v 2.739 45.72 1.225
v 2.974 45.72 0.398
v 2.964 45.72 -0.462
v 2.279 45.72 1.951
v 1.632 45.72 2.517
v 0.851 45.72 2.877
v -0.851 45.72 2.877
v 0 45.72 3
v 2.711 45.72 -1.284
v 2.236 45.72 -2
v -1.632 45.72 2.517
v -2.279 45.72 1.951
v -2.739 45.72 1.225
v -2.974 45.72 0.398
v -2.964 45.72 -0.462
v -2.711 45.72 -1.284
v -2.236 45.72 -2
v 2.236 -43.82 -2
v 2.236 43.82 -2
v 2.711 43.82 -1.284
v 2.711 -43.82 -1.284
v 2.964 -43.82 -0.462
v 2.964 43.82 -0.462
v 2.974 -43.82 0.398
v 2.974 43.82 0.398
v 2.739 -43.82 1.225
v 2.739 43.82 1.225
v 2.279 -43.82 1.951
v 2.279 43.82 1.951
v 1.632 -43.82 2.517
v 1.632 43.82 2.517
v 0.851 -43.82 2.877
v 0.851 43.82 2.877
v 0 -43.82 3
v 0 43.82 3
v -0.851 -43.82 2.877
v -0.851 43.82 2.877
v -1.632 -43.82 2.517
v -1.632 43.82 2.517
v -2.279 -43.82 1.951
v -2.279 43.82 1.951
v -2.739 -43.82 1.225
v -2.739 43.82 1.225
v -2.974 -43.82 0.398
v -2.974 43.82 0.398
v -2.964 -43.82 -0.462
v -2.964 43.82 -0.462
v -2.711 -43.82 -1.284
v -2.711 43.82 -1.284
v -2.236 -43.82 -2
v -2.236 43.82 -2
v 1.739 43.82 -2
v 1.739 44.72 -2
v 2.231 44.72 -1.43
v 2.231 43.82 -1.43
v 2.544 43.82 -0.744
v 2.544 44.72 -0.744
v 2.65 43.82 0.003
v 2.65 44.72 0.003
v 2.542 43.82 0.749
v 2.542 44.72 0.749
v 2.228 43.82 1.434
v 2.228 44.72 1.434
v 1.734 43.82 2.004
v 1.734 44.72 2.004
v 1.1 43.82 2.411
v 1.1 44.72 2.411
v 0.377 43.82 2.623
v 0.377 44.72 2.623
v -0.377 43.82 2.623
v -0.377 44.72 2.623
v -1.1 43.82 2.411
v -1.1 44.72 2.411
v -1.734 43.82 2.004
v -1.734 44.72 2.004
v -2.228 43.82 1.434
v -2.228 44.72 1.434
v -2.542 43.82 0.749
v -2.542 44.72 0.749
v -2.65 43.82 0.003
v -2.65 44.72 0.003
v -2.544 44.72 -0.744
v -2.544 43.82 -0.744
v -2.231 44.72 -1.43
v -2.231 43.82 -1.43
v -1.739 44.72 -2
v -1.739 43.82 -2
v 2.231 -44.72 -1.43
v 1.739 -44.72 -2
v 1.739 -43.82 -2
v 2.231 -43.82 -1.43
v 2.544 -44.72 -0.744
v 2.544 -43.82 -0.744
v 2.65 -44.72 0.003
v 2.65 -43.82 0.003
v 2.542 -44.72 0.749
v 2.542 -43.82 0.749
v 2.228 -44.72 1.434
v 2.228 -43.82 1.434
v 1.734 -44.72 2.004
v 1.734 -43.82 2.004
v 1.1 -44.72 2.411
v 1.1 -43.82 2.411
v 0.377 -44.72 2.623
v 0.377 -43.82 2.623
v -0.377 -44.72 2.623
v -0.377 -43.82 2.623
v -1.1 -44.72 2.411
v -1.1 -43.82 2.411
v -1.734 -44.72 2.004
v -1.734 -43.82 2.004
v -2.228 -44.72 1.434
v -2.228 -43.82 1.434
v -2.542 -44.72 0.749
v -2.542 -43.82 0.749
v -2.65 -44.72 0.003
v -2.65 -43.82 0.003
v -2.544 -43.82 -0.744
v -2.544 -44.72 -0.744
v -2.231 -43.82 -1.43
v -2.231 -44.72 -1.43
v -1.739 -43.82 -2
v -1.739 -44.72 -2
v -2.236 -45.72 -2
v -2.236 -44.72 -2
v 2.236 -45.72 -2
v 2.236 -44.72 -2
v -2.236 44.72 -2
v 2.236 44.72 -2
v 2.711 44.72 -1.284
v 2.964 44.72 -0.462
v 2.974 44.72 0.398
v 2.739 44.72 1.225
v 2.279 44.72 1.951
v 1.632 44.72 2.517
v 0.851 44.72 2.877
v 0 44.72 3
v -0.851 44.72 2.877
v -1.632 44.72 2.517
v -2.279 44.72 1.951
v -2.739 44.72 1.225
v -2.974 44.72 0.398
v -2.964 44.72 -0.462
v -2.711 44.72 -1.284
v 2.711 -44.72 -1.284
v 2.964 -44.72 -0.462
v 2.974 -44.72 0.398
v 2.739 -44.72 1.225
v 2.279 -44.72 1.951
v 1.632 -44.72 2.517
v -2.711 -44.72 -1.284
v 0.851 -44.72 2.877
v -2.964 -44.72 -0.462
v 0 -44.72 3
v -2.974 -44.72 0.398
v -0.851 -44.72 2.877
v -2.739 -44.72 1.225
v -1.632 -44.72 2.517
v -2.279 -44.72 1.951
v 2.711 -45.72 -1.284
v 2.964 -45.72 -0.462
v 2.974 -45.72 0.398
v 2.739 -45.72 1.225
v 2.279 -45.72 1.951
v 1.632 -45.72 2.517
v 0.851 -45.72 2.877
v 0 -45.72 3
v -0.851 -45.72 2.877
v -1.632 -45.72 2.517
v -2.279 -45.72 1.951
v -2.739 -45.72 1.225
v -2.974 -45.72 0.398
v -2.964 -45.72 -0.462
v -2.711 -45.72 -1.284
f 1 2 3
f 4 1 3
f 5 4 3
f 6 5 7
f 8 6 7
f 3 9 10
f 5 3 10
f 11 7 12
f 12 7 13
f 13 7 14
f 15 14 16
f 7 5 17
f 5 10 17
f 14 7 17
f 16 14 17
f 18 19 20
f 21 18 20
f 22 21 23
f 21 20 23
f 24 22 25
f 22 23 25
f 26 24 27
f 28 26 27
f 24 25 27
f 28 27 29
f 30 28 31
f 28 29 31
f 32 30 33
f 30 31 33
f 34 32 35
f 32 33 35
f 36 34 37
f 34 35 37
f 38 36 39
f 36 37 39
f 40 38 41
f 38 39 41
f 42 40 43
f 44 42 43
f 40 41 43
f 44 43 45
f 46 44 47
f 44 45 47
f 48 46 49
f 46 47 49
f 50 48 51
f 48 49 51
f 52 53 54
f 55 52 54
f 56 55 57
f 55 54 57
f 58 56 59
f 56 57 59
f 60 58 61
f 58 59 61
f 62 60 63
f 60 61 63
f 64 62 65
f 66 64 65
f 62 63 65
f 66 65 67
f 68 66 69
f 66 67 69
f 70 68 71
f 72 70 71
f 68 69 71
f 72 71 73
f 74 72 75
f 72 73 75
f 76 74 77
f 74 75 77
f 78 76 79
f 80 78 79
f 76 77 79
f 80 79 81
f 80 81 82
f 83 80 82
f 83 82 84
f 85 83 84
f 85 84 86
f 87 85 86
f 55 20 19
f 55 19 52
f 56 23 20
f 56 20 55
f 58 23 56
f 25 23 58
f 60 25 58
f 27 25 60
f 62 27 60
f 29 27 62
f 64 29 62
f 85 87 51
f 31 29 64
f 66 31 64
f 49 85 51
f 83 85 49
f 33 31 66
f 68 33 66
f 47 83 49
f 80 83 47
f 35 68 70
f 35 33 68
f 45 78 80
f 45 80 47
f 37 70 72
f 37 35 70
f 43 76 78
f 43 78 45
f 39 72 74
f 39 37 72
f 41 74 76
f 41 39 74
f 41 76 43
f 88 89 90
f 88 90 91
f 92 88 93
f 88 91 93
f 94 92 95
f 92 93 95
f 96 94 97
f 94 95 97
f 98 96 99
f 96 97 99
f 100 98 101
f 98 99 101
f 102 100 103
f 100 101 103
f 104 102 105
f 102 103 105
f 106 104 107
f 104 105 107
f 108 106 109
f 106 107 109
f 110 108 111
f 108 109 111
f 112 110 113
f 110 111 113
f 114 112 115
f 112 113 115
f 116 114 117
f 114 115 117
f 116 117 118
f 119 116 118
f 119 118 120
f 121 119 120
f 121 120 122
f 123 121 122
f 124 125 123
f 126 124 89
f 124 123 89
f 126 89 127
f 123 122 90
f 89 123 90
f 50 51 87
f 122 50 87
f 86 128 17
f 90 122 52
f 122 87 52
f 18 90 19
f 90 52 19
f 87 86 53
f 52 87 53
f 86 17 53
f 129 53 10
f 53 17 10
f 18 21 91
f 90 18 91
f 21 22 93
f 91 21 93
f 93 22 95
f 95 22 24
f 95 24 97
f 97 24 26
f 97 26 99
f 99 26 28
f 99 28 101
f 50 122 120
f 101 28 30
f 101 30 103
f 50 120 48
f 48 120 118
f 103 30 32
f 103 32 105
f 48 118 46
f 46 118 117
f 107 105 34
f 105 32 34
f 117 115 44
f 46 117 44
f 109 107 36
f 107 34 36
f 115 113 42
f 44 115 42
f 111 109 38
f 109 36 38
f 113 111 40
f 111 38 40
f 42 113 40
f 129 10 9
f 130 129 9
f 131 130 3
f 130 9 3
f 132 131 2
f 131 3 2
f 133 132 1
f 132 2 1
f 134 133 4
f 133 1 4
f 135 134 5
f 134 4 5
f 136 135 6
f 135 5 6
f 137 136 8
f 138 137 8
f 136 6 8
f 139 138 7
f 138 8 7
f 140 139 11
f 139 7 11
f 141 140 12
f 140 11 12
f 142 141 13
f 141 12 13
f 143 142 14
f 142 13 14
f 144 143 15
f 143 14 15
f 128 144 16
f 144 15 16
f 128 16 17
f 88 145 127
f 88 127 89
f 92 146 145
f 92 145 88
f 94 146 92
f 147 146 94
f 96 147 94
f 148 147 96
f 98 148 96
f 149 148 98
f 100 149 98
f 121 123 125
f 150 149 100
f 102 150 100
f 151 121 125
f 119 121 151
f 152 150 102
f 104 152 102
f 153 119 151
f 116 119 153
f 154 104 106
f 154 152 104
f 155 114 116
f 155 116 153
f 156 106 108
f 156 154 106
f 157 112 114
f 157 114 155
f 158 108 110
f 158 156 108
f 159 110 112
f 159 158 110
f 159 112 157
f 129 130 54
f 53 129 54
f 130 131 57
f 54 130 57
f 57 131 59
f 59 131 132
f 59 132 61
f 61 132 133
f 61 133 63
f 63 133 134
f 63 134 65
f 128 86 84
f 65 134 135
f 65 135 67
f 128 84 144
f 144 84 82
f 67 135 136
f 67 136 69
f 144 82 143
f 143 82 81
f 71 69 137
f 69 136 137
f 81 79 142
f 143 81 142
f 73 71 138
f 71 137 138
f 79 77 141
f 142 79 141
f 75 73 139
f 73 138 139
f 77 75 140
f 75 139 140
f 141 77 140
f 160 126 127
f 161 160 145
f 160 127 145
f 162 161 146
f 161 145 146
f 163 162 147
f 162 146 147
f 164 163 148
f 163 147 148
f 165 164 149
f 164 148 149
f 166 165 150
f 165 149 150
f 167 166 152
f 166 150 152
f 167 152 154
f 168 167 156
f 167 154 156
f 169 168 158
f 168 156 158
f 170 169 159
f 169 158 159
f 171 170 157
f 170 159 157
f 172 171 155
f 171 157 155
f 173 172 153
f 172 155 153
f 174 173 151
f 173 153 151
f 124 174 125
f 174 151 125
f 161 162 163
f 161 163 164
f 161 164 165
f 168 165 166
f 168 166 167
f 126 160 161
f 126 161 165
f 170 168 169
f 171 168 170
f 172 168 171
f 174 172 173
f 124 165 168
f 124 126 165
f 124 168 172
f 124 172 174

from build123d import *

# Parameters (mm, degrees)
BOSS_EXTRUDE1_DEPTH = 45.72
SKETCH2_W           = 0.35
SKETCH2_H           = 0.9


with BuildPart() as part:
    # Sketch1 → Boss-Extrude1 (new body, symmetric)
    with BuildSketch(Plane(origin=(0, 0, 0), x_dir=(1, 0, 0), z_dir=(0, 1, 0))):
        with BuildLine():
            Line((-2.236067977, 2), (2.236067977, 2))
            ThreePointArc((2.236067977, 2), (0, -3), (-2.236067977, 2))
        make_face()
    extrude(amount=BOSS_EXTRUDE1_DEPTH, both=True)

    # Sketch2 → Cut-Revolve1 (revolve, cut)
    with BuildSketch(Plane.XY):
        with Locations((2.825, 44.27)):
            Rectangle(SKETCH2_W, SKETCH2_H)
        with Locations((2.825, -44.27)):
            Rectangle(SKETCH2_W, SKETCH2_H)
    revolve(axis=Axis((0, 48.05613995, 0), (0, -1, 0)), mode=Mode.SUBTRACT)


solid = part.part
